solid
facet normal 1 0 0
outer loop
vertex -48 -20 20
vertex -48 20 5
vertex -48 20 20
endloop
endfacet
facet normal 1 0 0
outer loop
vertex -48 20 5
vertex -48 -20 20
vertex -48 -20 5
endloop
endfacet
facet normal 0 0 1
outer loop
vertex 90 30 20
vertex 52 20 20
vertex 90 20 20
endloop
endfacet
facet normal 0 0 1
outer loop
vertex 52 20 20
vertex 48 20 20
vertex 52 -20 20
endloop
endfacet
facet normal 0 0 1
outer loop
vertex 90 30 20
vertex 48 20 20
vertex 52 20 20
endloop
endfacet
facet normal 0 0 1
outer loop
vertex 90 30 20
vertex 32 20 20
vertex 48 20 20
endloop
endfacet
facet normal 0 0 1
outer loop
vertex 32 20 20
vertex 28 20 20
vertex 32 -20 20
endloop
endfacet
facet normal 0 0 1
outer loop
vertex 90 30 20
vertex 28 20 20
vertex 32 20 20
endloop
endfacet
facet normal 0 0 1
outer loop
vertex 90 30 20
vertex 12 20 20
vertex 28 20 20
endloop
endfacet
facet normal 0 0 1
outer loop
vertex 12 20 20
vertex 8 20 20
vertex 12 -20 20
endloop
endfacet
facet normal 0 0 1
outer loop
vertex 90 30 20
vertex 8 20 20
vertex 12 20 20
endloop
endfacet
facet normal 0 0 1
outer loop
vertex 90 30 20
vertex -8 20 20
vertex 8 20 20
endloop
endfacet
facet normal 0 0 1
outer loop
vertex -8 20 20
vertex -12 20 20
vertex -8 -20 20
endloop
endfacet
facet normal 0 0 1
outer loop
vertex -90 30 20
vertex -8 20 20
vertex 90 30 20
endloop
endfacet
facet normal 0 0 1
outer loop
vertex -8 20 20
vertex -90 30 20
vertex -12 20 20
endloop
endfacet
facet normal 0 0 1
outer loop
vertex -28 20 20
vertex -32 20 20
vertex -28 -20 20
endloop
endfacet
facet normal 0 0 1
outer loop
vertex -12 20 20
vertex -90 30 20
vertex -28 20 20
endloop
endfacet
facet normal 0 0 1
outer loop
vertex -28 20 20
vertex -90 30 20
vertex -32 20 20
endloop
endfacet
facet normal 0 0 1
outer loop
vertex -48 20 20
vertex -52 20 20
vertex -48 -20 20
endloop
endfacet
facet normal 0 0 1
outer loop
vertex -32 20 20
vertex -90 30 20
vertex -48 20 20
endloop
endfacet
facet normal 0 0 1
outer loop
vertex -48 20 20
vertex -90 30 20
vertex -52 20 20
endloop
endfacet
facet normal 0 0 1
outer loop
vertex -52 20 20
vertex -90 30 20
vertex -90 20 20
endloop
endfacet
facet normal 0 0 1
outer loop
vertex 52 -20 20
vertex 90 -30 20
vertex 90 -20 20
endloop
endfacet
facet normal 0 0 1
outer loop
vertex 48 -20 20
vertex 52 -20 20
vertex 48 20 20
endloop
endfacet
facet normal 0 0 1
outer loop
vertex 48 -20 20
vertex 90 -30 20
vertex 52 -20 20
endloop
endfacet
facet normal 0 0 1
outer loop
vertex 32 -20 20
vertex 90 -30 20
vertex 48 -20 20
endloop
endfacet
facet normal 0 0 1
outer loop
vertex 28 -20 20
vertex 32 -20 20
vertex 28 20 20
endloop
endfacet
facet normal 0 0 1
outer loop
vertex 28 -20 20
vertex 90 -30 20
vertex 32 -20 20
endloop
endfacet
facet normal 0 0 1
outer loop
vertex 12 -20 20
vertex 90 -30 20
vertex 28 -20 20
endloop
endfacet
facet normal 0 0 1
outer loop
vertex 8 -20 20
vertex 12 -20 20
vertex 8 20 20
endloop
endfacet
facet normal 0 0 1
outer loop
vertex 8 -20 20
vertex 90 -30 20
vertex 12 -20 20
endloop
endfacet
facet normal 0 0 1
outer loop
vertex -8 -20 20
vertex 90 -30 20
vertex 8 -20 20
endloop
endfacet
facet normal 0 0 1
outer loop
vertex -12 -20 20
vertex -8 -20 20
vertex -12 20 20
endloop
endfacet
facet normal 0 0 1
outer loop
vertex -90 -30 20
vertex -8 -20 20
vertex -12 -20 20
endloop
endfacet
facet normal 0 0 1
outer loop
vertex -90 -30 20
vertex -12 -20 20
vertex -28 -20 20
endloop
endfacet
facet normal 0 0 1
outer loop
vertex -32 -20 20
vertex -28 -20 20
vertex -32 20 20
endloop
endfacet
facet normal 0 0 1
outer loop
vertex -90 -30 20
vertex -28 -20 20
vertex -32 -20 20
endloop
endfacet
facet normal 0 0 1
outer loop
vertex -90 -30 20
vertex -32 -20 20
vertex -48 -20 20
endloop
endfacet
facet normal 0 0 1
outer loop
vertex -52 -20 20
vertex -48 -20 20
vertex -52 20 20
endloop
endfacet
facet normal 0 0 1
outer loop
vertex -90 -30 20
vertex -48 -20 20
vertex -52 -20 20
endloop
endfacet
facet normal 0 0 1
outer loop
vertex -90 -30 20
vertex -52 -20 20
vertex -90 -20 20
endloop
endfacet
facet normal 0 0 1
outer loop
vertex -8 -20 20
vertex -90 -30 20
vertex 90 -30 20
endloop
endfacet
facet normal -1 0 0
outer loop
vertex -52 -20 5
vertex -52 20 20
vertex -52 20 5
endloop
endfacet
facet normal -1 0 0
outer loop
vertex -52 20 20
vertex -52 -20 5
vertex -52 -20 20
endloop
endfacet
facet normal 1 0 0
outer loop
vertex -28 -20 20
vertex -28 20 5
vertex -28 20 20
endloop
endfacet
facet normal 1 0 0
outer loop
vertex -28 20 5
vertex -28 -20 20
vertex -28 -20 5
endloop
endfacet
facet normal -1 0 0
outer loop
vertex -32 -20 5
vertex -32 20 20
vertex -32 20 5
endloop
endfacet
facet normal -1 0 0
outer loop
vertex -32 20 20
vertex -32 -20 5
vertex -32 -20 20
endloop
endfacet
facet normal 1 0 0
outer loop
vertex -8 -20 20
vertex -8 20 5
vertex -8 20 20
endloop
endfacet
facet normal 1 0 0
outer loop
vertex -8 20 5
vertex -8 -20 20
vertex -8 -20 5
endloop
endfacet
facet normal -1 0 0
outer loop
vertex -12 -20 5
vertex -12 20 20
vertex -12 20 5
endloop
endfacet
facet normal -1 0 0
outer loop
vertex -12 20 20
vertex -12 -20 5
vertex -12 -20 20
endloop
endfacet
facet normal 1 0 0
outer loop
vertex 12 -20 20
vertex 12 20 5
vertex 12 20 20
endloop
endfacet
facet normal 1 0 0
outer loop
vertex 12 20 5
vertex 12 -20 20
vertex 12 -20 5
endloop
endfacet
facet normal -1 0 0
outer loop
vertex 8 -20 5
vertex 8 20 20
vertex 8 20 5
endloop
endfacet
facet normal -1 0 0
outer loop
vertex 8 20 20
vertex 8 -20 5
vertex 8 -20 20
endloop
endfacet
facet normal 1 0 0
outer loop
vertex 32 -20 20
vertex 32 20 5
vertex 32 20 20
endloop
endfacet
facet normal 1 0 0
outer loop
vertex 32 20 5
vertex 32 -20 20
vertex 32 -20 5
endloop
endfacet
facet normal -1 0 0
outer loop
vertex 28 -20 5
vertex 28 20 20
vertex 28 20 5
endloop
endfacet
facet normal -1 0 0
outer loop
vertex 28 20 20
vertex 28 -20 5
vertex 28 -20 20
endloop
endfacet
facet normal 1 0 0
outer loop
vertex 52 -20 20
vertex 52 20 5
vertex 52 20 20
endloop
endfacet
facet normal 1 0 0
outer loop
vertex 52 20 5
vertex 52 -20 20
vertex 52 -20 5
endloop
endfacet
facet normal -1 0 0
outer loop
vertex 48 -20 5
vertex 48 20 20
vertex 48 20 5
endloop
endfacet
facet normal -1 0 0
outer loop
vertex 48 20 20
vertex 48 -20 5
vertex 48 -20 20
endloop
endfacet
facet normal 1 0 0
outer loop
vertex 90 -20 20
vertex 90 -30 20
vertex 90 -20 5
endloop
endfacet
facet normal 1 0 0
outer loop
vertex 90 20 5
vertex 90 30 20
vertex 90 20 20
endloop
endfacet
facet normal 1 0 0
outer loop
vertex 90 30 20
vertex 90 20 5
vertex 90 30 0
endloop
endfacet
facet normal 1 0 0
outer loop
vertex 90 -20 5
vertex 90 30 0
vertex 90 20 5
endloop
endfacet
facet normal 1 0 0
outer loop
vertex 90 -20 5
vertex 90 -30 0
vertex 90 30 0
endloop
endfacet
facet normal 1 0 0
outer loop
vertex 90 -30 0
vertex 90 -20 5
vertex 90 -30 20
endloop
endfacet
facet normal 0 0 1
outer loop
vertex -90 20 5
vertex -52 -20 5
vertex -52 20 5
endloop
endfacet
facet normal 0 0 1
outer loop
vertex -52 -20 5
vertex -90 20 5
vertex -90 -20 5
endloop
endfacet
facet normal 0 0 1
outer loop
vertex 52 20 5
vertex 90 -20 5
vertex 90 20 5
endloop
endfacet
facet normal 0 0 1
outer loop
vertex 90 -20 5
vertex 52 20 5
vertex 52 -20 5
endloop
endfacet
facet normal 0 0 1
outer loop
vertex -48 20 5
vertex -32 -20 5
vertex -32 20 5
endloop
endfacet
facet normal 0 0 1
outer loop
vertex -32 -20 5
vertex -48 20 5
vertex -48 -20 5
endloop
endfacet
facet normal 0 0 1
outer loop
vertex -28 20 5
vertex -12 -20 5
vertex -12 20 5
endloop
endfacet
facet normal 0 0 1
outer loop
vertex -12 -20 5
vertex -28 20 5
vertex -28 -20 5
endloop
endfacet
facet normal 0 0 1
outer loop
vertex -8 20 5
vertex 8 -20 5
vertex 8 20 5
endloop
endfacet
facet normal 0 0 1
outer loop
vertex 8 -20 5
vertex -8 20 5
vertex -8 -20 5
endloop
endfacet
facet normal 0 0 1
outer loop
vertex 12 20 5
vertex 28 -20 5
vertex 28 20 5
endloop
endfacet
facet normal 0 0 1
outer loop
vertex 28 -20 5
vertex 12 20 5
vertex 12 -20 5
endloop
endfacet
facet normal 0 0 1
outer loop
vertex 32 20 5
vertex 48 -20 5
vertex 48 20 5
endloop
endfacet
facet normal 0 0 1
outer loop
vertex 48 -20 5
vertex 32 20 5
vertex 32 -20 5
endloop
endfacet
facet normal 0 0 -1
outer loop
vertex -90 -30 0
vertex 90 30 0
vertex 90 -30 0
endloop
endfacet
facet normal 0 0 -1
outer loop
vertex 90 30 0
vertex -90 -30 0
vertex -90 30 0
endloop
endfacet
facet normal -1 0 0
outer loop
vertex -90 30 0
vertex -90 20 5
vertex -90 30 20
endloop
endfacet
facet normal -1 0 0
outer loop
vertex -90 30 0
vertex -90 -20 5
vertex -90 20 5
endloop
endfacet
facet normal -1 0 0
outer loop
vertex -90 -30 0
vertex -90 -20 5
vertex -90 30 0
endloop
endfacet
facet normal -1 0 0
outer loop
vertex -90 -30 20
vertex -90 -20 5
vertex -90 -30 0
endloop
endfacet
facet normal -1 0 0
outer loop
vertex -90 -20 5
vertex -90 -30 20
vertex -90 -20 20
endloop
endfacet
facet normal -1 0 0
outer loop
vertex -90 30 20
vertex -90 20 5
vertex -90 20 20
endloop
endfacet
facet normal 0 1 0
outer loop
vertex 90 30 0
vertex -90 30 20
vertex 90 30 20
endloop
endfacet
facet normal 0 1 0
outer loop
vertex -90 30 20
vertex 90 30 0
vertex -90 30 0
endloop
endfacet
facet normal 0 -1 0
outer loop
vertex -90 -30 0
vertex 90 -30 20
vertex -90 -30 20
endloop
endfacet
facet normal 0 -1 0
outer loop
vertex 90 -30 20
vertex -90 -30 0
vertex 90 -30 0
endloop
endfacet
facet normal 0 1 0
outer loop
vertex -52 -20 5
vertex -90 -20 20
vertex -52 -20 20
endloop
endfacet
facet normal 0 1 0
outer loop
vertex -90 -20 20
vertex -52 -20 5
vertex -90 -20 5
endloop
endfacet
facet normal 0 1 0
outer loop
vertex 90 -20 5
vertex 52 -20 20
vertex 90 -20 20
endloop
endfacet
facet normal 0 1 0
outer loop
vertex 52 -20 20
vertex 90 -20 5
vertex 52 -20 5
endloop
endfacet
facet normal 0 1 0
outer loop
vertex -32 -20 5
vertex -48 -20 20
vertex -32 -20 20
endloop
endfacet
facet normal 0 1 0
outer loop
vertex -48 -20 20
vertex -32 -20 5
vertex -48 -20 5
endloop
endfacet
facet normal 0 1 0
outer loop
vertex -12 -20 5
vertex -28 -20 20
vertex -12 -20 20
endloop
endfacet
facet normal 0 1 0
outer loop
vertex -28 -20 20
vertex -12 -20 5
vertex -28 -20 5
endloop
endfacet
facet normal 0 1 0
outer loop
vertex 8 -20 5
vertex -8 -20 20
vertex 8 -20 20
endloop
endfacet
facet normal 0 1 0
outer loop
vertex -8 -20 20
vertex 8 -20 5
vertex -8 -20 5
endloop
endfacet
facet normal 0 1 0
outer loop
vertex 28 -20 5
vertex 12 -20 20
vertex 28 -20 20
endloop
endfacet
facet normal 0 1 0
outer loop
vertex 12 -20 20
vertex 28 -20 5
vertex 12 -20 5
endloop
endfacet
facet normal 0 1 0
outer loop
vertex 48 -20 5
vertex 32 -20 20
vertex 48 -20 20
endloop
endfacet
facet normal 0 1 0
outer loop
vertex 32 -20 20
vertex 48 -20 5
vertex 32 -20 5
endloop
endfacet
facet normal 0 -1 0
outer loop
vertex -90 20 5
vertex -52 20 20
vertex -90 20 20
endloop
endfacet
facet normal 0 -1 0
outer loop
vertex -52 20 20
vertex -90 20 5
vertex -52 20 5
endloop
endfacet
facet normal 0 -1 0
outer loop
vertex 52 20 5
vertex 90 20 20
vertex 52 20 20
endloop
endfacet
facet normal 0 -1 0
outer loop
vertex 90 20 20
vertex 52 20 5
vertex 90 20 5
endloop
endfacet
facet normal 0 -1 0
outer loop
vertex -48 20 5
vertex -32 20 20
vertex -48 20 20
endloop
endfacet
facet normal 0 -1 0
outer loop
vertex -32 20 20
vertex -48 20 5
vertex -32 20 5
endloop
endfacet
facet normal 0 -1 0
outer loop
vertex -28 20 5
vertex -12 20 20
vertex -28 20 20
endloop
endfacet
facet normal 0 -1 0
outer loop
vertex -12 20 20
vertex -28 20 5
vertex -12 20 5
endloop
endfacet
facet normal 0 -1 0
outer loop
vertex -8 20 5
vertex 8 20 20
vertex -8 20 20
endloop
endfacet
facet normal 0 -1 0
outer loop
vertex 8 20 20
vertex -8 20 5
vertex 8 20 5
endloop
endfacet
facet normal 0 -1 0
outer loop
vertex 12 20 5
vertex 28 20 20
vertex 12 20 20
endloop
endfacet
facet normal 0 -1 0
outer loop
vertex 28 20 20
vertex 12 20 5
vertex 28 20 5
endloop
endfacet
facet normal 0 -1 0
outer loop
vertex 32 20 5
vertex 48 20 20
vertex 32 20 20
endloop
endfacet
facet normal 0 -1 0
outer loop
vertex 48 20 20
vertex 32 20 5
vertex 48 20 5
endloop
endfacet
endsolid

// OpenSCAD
$fn = 32;

// ----------------------------------------------------------------------
// Rib frame 180 x 60 x 20
// 6 ribs at 20 mm pitch
// ----------------------------------------------------------------------

// --- parameters (mm) ---
frame = [180, 60, 5];  // base plate size (x, y, z)
rail_w = 10;           // side rail width
ribs = 6;              // number of ribs
rib_t = 4;             // rib thickness
rib_h = 15;            // rib height above the base plate
pitch = 20;            // pitch between rib centres

// --- derived feature positions (mm) ---
span = (ribs - 1) * pitch;          // = 100   distance between the outer ribs
origin_x = -span / 2;               // = -50   X of the first rib
rib_len = frame[1] - 2 * rail_w + 2;  // = 42   rib length, 1 mm into each rail
feature_centers = [
  [origin_x + 0 * pitch, 0],
  [origin_x + 1 * pitch, 0],
  [origin_x + 2 * pitch, 0],
  [origin_x + 3 * pitch, 0],
  [origin_x + 4 * pitch, 0],
  [origin_x + 5 * pitch, 0]
];   // rib centre line, drives the rib loop

// base plate, two side rails, then the ribs read straight off feature_centers
union() {
  translate([-frame[0] / 2, -frame[1] / 2, 0]) cube(frame);
  translate([-frame[0] / 2, -frame[1] / 2, 0]) cube([frame[0], rail_w, frame[2] + rib_h]);
  translate([-frame[0] / 2, frame[1] / 2 - rail_w, 0]) cube([frame[0], rail_w, frame[2] + rib_h]);
  for (centre = feature_centers)
    translate([centre[0] - rib_t / 2, centre[1] - rib_len / 2, frame[2] - 1])
      cube([rib_t, rib_len, rib_h + 1]);
}
